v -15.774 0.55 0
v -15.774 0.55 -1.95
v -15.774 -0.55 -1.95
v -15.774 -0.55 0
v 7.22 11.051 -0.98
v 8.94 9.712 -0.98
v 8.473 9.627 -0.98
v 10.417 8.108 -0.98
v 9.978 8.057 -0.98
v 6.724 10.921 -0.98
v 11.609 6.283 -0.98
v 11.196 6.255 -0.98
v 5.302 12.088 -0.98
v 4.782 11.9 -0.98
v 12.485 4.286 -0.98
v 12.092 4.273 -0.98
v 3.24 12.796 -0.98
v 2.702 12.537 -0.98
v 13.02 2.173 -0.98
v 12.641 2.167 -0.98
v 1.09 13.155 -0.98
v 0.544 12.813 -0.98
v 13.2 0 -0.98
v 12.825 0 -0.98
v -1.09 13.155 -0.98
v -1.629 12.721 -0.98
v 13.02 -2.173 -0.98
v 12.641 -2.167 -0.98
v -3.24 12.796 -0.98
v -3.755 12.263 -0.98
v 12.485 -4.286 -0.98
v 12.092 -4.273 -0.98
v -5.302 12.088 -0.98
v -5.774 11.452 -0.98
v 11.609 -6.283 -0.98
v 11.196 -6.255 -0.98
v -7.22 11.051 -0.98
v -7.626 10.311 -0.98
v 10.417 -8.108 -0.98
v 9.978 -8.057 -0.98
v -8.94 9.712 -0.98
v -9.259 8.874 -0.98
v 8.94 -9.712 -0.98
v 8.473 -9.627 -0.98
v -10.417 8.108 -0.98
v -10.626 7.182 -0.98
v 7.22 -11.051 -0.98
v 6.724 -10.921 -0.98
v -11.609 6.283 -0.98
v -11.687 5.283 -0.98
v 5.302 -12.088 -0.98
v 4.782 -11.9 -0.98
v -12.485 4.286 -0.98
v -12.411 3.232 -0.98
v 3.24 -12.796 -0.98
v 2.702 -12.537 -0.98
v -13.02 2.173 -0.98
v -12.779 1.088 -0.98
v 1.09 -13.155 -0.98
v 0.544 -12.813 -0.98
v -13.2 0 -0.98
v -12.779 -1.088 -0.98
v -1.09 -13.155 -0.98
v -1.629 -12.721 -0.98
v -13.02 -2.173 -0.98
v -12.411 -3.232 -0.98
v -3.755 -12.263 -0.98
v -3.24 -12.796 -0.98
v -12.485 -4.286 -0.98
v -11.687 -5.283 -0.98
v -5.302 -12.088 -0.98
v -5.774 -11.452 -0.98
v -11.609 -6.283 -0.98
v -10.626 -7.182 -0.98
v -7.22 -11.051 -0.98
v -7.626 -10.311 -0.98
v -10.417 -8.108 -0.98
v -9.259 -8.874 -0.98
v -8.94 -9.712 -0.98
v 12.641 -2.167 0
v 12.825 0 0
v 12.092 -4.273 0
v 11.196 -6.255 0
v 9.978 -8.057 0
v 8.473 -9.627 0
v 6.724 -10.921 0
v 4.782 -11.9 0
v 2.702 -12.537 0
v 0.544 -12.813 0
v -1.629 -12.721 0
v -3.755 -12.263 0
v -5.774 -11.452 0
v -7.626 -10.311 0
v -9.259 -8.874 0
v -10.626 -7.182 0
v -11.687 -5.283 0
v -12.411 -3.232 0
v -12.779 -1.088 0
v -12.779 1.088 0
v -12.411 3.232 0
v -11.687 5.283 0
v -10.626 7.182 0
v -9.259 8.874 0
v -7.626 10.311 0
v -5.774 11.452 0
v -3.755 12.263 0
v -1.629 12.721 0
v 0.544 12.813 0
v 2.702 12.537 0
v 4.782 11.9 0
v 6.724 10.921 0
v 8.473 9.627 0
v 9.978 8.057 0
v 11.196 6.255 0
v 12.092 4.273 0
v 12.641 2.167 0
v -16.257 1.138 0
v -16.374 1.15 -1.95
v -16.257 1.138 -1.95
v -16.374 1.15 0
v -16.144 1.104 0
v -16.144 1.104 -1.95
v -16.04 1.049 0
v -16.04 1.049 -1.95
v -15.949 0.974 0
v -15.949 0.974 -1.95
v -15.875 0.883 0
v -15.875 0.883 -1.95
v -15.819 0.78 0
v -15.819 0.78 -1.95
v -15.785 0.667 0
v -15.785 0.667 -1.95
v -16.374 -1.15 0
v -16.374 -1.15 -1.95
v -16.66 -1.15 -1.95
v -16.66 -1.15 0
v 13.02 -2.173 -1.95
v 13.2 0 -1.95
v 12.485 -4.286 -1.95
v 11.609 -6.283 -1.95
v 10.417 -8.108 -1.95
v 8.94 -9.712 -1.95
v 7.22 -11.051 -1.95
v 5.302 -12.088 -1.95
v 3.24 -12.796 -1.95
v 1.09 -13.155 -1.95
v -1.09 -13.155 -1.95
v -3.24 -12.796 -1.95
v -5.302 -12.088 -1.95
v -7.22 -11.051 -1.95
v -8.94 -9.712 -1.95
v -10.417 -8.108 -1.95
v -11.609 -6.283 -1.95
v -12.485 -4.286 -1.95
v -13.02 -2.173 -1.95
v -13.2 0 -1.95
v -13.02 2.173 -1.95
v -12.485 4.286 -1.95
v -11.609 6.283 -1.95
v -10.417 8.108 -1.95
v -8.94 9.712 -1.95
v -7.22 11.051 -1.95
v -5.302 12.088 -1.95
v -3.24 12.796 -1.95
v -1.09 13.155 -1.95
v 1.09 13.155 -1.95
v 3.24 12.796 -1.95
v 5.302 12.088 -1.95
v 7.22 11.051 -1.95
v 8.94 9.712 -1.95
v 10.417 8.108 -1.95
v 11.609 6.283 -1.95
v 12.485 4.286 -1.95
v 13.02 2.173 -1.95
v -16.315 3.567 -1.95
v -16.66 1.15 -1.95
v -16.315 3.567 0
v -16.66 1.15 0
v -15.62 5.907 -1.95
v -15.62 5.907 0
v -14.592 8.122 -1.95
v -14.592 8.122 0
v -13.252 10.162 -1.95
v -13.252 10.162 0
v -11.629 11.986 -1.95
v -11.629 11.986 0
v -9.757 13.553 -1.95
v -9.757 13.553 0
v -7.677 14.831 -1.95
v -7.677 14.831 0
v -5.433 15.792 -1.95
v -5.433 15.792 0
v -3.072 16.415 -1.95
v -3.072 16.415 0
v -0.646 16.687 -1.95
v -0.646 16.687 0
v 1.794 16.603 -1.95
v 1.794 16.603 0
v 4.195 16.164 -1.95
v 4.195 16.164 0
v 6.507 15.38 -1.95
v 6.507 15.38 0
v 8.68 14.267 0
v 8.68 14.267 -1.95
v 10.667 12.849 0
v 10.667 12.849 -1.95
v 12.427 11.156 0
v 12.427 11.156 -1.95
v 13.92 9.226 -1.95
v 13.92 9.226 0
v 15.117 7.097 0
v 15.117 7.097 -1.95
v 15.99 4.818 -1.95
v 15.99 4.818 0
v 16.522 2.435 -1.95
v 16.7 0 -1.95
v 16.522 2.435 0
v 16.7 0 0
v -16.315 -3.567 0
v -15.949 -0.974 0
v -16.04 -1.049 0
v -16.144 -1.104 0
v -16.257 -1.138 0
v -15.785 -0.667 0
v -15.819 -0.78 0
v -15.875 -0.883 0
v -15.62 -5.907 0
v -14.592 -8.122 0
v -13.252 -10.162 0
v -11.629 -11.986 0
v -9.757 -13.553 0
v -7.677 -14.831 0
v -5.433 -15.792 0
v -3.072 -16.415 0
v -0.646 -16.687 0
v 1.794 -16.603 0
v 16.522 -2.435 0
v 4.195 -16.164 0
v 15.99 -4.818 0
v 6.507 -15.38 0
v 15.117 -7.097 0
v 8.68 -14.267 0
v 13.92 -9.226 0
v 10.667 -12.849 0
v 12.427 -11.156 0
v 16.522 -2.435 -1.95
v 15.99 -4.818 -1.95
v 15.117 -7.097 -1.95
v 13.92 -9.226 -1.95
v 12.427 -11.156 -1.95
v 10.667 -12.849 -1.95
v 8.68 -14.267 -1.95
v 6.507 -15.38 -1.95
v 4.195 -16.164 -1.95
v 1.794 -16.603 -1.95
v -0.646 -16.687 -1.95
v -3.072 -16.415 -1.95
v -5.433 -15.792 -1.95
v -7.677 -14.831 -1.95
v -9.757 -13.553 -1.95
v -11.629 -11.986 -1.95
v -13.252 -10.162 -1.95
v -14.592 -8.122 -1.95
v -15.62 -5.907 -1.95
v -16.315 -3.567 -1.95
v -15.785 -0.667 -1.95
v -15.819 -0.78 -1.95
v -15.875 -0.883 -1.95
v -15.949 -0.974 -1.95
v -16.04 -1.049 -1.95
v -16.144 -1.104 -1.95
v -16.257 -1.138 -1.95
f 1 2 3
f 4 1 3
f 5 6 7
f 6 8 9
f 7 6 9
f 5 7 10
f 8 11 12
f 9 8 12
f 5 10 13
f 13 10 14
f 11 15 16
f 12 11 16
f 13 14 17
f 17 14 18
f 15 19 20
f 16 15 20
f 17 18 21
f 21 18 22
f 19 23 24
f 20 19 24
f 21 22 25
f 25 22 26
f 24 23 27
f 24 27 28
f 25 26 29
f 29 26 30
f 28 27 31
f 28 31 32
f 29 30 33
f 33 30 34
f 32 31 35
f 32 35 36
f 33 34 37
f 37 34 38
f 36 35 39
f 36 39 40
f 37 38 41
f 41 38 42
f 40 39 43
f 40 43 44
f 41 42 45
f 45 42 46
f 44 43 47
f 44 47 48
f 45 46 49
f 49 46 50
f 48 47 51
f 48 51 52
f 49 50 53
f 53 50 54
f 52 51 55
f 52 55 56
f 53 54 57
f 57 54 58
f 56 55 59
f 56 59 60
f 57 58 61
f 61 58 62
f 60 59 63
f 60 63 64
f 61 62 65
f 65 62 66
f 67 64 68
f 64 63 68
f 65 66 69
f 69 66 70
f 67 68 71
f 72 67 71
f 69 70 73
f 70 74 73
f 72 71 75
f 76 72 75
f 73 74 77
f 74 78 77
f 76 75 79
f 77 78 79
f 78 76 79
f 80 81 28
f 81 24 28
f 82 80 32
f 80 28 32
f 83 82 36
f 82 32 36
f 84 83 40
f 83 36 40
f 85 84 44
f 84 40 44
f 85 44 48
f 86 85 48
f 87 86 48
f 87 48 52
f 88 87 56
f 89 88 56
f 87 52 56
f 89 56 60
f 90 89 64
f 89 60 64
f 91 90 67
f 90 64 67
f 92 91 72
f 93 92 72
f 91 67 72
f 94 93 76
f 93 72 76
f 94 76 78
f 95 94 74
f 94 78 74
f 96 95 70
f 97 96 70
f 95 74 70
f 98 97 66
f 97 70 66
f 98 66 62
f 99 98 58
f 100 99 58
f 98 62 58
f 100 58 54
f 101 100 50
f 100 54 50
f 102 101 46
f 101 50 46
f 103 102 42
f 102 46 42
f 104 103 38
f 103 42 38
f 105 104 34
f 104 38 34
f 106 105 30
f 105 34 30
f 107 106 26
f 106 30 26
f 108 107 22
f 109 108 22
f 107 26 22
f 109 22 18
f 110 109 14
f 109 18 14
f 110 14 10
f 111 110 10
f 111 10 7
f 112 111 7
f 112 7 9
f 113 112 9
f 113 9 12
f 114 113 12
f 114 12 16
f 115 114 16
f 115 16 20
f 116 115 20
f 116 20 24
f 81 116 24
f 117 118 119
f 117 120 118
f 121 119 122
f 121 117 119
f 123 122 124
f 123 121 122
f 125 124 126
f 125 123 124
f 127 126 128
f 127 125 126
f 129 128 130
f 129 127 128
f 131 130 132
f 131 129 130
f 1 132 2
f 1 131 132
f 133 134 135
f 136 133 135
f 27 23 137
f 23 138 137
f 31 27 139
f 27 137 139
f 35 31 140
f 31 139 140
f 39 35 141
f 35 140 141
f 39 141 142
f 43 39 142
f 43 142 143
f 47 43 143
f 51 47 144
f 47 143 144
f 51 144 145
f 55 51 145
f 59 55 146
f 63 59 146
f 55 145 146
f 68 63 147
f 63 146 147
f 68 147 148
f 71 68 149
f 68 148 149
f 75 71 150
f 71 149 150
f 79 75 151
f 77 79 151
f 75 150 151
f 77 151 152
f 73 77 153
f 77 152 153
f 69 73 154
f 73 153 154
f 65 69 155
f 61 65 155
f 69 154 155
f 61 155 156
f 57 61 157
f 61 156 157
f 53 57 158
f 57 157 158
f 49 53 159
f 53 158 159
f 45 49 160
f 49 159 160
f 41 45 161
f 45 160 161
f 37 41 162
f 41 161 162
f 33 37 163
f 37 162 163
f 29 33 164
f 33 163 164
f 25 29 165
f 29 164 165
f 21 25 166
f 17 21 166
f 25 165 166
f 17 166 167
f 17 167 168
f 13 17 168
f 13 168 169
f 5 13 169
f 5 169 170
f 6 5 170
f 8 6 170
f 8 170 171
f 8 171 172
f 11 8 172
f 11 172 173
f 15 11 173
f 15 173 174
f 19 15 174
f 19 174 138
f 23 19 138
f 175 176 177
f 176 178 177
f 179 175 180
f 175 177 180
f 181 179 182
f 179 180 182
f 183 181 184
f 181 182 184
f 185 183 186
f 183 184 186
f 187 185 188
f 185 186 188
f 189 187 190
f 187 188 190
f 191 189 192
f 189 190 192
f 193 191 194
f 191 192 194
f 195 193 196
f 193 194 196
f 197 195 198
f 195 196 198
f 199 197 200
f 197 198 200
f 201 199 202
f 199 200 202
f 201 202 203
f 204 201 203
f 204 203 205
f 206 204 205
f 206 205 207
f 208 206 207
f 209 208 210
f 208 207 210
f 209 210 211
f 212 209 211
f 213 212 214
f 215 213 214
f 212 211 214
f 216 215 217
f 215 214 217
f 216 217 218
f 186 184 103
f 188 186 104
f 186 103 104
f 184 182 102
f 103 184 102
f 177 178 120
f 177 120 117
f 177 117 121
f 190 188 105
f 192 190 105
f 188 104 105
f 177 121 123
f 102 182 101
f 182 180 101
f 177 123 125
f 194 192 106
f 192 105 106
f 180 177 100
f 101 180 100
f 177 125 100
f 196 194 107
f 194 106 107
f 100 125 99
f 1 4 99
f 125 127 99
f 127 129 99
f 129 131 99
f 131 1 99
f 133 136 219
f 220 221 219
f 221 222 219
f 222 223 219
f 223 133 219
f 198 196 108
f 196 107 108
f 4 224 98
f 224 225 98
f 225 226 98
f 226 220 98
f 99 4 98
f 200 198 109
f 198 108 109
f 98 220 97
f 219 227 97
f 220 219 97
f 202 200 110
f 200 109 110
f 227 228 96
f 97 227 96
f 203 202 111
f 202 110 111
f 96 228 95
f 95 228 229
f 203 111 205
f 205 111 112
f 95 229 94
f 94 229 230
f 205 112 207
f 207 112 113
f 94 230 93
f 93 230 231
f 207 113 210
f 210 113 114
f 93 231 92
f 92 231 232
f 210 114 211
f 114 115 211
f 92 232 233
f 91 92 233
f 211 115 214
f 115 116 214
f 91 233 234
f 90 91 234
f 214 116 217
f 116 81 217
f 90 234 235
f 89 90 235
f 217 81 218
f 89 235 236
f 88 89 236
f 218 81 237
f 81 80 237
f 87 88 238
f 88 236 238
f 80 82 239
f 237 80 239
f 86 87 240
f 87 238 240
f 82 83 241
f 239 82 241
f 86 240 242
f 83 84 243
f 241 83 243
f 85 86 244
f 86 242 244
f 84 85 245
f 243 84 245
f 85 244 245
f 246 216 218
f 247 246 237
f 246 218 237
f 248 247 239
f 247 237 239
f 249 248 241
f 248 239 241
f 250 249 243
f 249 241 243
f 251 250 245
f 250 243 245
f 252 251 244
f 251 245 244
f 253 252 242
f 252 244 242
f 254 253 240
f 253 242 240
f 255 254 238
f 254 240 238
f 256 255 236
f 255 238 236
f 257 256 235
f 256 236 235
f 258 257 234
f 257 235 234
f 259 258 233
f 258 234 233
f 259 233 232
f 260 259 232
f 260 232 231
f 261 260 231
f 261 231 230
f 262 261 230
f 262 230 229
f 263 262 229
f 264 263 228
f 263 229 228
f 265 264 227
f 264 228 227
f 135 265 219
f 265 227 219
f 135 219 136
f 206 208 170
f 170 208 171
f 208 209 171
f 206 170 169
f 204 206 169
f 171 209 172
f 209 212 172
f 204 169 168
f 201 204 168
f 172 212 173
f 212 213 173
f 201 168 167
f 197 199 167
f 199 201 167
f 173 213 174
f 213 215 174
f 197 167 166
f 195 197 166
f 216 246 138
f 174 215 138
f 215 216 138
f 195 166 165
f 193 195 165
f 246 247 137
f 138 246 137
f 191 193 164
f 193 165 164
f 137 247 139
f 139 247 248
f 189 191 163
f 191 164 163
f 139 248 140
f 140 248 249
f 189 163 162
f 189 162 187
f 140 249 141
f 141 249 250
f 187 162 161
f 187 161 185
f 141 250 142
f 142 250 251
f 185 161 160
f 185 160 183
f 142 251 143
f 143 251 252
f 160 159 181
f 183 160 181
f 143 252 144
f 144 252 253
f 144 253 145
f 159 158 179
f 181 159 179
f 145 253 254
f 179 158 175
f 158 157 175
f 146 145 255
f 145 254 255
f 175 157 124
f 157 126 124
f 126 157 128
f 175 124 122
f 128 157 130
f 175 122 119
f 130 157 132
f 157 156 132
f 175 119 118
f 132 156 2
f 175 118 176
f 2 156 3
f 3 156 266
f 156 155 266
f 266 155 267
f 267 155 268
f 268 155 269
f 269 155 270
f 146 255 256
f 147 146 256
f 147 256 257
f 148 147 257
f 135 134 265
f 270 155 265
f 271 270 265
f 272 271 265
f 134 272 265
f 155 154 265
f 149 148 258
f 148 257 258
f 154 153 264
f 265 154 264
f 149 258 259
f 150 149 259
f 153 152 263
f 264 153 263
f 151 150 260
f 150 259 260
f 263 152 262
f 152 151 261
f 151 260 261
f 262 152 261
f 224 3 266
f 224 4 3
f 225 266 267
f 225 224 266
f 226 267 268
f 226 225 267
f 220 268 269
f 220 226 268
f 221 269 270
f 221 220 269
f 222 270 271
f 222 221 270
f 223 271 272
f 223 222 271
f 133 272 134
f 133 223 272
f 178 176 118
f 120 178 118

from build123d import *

# Parameters (mm, degrees)
CUT_EXTRUDE_1_DEPTH = 3
FILLET_2_R          = 0.6


with BuildPart() as part:
    # Эскиз1 → Повернуть1 (revolve)
    with BuildSketch(Plane(origin=(0, 0, 0), x_dir=(1, 0, 0), z_dir=(0, 1, 0)), mode=Mode.PRIVATE) as revolve_1_sk:
        Polygon((-16.7, 0), (-12.825, 0), (-12.825, 0.98), (-13.2, 0.98), (-13.2, 1.95), (-16.7, 1.95), align=None)
    revolve(revolve_1_sk.sketch.rotate(Axis((0, 0, 0), (0, 0, -1)), 180), axis=Axis((0, 0, 0), (0, 0, -1)))

    # Эскиз2 → Вырез-Вытянуть1 (cut)
    with BuildSketch(Plane(origin=(0, 0, -1.95), x_dir=(-1, 0, 0), z_dir=(0, 0, -1))):
        with BuildLine():
            Line((16.660357139, 1.15), (15.773622825, 1.15))
            Line((15.773622825, 1.15), (15.773622825, -1.15))
            Line((15.773622825, -1.15), (16.660357139, -1.15))
            ThreePointArc((16.660357139, -1.15), (16.850858655, 0), (16.660357139, 1.15))
        make_face()
    extrude(amount=-CUT_EXTRUDE_1_DEPTH, mode=Mode.SUBTRACT)

    # Скругление2
    fillet_2_edges = [part.edges().sort_by_distance(p)[0] for p in [
        (-15.773622825, -1.15, -0.975),
        (-15.773622825, 1.15, -0.975),
    ]]
    fillet(fillet_2_edges, radius=FILLET_2_R)


solid = part.part
